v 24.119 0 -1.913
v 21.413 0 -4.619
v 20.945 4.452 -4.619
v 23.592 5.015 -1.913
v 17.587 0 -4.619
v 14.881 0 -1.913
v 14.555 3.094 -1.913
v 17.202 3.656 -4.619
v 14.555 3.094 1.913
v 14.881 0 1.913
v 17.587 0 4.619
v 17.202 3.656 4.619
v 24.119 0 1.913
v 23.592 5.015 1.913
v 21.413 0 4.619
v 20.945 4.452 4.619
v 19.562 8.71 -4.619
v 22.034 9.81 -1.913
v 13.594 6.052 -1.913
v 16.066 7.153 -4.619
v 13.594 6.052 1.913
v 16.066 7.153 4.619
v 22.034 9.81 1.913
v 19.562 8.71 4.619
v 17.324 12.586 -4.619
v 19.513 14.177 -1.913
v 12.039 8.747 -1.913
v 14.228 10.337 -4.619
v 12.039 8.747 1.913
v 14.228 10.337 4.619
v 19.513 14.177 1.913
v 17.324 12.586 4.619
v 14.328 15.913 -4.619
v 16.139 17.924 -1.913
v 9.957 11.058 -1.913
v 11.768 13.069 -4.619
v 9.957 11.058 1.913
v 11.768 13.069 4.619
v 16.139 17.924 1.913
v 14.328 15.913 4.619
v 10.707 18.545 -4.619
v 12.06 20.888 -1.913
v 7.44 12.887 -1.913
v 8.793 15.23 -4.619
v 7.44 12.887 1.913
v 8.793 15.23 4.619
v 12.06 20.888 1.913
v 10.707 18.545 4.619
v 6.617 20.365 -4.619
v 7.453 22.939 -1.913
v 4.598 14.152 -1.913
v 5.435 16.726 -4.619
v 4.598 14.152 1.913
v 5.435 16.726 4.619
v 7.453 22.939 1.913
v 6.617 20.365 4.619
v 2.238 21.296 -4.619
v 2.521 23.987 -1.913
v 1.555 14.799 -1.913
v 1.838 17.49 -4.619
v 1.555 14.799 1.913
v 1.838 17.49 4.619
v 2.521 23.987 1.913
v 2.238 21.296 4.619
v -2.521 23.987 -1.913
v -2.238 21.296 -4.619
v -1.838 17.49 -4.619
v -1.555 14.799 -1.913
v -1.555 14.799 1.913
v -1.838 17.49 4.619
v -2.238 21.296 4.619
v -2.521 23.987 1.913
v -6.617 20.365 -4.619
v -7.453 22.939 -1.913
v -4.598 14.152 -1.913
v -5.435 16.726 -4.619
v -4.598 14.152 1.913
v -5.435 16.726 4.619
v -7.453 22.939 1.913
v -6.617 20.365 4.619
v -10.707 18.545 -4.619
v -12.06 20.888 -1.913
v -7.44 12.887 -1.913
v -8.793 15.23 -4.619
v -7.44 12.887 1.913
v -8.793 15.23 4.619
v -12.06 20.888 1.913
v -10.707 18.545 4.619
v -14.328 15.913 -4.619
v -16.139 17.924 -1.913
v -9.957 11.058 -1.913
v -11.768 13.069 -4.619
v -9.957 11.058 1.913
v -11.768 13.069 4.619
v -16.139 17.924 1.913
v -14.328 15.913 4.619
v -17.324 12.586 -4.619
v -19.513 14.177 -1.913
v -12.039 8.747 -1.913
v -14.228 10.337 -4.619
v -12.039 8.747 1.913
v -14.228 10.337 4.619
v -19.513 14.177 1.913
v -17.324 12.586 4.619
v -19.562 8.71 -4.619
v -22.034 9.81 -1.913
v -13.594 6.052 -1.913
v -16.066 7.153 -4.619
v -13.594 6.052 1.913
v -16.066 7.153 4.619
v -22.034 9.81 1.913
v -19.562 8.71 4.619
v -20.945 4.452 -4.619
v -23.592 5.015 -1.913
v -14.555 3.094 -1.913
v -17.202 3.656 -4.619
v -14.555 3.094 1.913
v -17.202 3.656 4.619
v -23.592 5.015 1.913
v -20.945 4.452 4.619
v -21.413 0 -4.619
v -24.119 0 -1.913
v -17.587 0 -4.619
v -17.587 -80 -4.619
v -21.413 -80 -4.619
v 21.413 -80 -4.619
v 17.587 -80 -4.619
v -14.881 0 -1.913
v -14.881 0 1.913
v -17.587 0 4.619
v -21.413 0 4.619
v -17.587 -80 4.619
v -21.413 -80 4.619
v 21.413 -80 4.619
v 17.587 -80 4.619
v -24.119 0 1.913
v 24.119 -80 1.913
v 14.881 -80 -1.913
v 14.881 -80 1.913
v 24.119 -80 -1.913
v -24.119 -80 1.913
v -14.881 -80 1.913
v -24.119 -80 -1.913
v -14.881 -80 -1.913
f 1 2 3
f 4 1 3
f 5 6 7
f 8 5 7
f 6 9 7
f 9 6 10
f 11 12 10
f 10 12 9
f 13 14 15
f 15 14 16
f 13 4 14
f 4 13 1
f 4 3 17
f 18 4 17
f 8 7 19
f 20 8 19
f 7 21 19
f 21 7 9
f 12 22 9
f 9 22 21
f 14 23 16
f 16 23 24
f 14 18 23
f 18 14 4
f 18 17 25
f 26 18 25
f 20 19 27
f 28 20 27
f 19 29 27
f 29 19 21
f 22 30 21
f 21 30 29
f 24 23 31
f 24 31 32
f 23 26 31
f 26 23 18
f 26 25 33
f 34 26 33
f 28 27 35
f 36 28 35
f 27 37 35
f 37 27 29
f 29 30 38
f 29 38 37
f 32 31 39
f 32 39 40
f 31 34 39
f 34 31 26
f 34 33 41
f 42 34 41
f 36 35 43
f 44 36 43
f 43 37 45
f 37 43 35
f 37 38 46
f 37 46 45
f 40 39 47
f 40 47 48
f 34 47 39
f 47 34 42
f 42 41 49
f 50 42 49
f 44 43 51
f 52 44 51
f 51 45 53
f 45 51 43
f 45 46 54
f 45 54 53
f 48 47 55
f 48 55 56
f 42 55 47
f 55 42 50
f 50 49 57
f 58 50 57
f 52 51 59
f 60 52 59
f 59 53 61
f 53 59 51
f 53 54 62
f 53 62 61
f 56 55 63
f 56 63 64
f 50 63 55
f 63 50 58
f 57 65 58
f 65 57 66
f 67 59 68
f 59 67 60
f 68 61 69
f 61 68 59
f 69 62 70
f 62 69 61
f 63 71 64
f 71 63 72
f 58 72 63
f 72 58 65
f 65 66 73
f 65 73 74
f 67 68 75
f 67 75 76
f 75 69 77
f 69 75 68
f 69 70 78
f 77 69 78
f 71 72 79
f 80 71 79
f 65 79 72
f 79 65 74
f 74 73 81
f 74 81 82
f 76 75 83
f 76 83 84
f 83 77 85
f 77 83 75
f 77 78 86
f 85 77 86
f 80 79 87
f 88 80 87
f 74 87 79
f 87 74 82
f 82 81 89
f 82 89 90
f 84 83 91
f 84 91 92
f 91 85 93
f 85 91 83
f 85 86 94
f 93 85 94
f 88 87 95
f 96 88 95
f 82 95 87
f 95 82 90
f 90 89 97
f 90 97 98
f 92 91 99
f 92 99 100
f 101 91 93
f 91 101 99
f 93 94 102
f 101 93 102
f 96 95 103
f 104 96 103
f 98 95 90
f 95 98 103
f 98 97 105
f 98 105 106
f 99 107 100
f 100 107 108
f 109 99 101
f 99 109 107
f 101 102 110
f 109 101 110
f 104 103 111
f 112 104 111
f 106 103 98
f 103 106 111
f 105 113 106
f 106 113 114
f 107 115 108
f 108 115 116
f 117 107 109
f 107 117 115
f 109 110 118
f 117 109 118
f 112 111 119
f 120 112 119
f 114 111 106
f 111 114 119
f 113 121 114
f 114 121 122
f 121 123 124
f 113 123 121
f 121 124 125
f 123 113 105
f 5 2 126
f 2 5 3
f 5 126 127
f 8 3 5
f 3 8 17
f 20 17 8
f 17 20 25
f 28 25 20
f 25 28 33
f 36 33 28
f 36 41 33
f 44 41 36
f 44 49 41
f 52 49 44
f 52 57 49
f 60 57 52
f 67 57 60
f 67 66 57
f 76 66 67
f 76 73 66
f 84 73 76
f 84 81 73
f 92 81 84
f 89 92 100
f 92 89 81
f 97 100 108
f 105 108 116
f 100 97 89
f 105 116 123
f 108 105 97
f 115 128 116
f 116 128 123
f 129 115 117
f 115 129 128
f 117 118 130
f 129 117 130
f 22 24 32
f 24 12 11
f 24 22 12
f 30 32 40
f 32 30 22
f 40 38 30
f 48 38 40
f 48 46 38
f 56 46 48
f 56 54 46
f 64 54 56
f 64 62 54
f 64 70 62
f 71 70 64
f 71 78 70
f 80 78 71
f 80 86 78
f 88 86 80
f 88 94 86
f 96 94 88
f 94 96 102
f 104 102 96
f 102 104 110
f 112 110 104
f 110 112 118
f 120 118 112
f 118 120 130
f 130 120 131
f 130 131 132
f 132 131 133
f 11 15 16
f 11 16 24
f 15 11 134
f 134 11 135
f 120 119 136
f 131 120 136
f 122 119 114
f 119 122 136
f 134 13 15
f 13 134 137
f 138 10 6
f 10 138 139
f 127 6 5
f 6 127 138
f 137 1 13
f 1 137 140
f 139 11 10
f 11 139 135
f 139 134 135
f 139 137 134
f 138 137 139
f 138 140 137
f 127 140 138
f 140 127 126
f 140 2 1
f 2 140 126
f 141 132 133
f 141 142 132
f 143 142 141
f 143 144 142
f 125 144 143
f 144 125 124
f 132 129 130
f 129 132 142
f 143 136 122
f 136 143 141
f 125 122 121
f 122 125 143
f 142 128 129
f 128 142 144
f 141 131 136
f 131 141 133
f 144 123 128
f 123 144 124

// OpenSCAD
length = 80;
width = 39;
half_w = width / 2;
thickness = 10;
half_t = thickness / 2;

rotate_extrude(angle = 180) translate([half_w, 0]) rotate(180 / 8) circle(r = half_t, $fn = 8);
translate([half_w, 0]) rotate([90, 180 / 8]) cylinder(r = half_t, h = length, $fn = 8);
translate([-half_w, 0]) rotate([90, 180 / 8]) cylinder(r = half_t, h = length, $fn = 8);
